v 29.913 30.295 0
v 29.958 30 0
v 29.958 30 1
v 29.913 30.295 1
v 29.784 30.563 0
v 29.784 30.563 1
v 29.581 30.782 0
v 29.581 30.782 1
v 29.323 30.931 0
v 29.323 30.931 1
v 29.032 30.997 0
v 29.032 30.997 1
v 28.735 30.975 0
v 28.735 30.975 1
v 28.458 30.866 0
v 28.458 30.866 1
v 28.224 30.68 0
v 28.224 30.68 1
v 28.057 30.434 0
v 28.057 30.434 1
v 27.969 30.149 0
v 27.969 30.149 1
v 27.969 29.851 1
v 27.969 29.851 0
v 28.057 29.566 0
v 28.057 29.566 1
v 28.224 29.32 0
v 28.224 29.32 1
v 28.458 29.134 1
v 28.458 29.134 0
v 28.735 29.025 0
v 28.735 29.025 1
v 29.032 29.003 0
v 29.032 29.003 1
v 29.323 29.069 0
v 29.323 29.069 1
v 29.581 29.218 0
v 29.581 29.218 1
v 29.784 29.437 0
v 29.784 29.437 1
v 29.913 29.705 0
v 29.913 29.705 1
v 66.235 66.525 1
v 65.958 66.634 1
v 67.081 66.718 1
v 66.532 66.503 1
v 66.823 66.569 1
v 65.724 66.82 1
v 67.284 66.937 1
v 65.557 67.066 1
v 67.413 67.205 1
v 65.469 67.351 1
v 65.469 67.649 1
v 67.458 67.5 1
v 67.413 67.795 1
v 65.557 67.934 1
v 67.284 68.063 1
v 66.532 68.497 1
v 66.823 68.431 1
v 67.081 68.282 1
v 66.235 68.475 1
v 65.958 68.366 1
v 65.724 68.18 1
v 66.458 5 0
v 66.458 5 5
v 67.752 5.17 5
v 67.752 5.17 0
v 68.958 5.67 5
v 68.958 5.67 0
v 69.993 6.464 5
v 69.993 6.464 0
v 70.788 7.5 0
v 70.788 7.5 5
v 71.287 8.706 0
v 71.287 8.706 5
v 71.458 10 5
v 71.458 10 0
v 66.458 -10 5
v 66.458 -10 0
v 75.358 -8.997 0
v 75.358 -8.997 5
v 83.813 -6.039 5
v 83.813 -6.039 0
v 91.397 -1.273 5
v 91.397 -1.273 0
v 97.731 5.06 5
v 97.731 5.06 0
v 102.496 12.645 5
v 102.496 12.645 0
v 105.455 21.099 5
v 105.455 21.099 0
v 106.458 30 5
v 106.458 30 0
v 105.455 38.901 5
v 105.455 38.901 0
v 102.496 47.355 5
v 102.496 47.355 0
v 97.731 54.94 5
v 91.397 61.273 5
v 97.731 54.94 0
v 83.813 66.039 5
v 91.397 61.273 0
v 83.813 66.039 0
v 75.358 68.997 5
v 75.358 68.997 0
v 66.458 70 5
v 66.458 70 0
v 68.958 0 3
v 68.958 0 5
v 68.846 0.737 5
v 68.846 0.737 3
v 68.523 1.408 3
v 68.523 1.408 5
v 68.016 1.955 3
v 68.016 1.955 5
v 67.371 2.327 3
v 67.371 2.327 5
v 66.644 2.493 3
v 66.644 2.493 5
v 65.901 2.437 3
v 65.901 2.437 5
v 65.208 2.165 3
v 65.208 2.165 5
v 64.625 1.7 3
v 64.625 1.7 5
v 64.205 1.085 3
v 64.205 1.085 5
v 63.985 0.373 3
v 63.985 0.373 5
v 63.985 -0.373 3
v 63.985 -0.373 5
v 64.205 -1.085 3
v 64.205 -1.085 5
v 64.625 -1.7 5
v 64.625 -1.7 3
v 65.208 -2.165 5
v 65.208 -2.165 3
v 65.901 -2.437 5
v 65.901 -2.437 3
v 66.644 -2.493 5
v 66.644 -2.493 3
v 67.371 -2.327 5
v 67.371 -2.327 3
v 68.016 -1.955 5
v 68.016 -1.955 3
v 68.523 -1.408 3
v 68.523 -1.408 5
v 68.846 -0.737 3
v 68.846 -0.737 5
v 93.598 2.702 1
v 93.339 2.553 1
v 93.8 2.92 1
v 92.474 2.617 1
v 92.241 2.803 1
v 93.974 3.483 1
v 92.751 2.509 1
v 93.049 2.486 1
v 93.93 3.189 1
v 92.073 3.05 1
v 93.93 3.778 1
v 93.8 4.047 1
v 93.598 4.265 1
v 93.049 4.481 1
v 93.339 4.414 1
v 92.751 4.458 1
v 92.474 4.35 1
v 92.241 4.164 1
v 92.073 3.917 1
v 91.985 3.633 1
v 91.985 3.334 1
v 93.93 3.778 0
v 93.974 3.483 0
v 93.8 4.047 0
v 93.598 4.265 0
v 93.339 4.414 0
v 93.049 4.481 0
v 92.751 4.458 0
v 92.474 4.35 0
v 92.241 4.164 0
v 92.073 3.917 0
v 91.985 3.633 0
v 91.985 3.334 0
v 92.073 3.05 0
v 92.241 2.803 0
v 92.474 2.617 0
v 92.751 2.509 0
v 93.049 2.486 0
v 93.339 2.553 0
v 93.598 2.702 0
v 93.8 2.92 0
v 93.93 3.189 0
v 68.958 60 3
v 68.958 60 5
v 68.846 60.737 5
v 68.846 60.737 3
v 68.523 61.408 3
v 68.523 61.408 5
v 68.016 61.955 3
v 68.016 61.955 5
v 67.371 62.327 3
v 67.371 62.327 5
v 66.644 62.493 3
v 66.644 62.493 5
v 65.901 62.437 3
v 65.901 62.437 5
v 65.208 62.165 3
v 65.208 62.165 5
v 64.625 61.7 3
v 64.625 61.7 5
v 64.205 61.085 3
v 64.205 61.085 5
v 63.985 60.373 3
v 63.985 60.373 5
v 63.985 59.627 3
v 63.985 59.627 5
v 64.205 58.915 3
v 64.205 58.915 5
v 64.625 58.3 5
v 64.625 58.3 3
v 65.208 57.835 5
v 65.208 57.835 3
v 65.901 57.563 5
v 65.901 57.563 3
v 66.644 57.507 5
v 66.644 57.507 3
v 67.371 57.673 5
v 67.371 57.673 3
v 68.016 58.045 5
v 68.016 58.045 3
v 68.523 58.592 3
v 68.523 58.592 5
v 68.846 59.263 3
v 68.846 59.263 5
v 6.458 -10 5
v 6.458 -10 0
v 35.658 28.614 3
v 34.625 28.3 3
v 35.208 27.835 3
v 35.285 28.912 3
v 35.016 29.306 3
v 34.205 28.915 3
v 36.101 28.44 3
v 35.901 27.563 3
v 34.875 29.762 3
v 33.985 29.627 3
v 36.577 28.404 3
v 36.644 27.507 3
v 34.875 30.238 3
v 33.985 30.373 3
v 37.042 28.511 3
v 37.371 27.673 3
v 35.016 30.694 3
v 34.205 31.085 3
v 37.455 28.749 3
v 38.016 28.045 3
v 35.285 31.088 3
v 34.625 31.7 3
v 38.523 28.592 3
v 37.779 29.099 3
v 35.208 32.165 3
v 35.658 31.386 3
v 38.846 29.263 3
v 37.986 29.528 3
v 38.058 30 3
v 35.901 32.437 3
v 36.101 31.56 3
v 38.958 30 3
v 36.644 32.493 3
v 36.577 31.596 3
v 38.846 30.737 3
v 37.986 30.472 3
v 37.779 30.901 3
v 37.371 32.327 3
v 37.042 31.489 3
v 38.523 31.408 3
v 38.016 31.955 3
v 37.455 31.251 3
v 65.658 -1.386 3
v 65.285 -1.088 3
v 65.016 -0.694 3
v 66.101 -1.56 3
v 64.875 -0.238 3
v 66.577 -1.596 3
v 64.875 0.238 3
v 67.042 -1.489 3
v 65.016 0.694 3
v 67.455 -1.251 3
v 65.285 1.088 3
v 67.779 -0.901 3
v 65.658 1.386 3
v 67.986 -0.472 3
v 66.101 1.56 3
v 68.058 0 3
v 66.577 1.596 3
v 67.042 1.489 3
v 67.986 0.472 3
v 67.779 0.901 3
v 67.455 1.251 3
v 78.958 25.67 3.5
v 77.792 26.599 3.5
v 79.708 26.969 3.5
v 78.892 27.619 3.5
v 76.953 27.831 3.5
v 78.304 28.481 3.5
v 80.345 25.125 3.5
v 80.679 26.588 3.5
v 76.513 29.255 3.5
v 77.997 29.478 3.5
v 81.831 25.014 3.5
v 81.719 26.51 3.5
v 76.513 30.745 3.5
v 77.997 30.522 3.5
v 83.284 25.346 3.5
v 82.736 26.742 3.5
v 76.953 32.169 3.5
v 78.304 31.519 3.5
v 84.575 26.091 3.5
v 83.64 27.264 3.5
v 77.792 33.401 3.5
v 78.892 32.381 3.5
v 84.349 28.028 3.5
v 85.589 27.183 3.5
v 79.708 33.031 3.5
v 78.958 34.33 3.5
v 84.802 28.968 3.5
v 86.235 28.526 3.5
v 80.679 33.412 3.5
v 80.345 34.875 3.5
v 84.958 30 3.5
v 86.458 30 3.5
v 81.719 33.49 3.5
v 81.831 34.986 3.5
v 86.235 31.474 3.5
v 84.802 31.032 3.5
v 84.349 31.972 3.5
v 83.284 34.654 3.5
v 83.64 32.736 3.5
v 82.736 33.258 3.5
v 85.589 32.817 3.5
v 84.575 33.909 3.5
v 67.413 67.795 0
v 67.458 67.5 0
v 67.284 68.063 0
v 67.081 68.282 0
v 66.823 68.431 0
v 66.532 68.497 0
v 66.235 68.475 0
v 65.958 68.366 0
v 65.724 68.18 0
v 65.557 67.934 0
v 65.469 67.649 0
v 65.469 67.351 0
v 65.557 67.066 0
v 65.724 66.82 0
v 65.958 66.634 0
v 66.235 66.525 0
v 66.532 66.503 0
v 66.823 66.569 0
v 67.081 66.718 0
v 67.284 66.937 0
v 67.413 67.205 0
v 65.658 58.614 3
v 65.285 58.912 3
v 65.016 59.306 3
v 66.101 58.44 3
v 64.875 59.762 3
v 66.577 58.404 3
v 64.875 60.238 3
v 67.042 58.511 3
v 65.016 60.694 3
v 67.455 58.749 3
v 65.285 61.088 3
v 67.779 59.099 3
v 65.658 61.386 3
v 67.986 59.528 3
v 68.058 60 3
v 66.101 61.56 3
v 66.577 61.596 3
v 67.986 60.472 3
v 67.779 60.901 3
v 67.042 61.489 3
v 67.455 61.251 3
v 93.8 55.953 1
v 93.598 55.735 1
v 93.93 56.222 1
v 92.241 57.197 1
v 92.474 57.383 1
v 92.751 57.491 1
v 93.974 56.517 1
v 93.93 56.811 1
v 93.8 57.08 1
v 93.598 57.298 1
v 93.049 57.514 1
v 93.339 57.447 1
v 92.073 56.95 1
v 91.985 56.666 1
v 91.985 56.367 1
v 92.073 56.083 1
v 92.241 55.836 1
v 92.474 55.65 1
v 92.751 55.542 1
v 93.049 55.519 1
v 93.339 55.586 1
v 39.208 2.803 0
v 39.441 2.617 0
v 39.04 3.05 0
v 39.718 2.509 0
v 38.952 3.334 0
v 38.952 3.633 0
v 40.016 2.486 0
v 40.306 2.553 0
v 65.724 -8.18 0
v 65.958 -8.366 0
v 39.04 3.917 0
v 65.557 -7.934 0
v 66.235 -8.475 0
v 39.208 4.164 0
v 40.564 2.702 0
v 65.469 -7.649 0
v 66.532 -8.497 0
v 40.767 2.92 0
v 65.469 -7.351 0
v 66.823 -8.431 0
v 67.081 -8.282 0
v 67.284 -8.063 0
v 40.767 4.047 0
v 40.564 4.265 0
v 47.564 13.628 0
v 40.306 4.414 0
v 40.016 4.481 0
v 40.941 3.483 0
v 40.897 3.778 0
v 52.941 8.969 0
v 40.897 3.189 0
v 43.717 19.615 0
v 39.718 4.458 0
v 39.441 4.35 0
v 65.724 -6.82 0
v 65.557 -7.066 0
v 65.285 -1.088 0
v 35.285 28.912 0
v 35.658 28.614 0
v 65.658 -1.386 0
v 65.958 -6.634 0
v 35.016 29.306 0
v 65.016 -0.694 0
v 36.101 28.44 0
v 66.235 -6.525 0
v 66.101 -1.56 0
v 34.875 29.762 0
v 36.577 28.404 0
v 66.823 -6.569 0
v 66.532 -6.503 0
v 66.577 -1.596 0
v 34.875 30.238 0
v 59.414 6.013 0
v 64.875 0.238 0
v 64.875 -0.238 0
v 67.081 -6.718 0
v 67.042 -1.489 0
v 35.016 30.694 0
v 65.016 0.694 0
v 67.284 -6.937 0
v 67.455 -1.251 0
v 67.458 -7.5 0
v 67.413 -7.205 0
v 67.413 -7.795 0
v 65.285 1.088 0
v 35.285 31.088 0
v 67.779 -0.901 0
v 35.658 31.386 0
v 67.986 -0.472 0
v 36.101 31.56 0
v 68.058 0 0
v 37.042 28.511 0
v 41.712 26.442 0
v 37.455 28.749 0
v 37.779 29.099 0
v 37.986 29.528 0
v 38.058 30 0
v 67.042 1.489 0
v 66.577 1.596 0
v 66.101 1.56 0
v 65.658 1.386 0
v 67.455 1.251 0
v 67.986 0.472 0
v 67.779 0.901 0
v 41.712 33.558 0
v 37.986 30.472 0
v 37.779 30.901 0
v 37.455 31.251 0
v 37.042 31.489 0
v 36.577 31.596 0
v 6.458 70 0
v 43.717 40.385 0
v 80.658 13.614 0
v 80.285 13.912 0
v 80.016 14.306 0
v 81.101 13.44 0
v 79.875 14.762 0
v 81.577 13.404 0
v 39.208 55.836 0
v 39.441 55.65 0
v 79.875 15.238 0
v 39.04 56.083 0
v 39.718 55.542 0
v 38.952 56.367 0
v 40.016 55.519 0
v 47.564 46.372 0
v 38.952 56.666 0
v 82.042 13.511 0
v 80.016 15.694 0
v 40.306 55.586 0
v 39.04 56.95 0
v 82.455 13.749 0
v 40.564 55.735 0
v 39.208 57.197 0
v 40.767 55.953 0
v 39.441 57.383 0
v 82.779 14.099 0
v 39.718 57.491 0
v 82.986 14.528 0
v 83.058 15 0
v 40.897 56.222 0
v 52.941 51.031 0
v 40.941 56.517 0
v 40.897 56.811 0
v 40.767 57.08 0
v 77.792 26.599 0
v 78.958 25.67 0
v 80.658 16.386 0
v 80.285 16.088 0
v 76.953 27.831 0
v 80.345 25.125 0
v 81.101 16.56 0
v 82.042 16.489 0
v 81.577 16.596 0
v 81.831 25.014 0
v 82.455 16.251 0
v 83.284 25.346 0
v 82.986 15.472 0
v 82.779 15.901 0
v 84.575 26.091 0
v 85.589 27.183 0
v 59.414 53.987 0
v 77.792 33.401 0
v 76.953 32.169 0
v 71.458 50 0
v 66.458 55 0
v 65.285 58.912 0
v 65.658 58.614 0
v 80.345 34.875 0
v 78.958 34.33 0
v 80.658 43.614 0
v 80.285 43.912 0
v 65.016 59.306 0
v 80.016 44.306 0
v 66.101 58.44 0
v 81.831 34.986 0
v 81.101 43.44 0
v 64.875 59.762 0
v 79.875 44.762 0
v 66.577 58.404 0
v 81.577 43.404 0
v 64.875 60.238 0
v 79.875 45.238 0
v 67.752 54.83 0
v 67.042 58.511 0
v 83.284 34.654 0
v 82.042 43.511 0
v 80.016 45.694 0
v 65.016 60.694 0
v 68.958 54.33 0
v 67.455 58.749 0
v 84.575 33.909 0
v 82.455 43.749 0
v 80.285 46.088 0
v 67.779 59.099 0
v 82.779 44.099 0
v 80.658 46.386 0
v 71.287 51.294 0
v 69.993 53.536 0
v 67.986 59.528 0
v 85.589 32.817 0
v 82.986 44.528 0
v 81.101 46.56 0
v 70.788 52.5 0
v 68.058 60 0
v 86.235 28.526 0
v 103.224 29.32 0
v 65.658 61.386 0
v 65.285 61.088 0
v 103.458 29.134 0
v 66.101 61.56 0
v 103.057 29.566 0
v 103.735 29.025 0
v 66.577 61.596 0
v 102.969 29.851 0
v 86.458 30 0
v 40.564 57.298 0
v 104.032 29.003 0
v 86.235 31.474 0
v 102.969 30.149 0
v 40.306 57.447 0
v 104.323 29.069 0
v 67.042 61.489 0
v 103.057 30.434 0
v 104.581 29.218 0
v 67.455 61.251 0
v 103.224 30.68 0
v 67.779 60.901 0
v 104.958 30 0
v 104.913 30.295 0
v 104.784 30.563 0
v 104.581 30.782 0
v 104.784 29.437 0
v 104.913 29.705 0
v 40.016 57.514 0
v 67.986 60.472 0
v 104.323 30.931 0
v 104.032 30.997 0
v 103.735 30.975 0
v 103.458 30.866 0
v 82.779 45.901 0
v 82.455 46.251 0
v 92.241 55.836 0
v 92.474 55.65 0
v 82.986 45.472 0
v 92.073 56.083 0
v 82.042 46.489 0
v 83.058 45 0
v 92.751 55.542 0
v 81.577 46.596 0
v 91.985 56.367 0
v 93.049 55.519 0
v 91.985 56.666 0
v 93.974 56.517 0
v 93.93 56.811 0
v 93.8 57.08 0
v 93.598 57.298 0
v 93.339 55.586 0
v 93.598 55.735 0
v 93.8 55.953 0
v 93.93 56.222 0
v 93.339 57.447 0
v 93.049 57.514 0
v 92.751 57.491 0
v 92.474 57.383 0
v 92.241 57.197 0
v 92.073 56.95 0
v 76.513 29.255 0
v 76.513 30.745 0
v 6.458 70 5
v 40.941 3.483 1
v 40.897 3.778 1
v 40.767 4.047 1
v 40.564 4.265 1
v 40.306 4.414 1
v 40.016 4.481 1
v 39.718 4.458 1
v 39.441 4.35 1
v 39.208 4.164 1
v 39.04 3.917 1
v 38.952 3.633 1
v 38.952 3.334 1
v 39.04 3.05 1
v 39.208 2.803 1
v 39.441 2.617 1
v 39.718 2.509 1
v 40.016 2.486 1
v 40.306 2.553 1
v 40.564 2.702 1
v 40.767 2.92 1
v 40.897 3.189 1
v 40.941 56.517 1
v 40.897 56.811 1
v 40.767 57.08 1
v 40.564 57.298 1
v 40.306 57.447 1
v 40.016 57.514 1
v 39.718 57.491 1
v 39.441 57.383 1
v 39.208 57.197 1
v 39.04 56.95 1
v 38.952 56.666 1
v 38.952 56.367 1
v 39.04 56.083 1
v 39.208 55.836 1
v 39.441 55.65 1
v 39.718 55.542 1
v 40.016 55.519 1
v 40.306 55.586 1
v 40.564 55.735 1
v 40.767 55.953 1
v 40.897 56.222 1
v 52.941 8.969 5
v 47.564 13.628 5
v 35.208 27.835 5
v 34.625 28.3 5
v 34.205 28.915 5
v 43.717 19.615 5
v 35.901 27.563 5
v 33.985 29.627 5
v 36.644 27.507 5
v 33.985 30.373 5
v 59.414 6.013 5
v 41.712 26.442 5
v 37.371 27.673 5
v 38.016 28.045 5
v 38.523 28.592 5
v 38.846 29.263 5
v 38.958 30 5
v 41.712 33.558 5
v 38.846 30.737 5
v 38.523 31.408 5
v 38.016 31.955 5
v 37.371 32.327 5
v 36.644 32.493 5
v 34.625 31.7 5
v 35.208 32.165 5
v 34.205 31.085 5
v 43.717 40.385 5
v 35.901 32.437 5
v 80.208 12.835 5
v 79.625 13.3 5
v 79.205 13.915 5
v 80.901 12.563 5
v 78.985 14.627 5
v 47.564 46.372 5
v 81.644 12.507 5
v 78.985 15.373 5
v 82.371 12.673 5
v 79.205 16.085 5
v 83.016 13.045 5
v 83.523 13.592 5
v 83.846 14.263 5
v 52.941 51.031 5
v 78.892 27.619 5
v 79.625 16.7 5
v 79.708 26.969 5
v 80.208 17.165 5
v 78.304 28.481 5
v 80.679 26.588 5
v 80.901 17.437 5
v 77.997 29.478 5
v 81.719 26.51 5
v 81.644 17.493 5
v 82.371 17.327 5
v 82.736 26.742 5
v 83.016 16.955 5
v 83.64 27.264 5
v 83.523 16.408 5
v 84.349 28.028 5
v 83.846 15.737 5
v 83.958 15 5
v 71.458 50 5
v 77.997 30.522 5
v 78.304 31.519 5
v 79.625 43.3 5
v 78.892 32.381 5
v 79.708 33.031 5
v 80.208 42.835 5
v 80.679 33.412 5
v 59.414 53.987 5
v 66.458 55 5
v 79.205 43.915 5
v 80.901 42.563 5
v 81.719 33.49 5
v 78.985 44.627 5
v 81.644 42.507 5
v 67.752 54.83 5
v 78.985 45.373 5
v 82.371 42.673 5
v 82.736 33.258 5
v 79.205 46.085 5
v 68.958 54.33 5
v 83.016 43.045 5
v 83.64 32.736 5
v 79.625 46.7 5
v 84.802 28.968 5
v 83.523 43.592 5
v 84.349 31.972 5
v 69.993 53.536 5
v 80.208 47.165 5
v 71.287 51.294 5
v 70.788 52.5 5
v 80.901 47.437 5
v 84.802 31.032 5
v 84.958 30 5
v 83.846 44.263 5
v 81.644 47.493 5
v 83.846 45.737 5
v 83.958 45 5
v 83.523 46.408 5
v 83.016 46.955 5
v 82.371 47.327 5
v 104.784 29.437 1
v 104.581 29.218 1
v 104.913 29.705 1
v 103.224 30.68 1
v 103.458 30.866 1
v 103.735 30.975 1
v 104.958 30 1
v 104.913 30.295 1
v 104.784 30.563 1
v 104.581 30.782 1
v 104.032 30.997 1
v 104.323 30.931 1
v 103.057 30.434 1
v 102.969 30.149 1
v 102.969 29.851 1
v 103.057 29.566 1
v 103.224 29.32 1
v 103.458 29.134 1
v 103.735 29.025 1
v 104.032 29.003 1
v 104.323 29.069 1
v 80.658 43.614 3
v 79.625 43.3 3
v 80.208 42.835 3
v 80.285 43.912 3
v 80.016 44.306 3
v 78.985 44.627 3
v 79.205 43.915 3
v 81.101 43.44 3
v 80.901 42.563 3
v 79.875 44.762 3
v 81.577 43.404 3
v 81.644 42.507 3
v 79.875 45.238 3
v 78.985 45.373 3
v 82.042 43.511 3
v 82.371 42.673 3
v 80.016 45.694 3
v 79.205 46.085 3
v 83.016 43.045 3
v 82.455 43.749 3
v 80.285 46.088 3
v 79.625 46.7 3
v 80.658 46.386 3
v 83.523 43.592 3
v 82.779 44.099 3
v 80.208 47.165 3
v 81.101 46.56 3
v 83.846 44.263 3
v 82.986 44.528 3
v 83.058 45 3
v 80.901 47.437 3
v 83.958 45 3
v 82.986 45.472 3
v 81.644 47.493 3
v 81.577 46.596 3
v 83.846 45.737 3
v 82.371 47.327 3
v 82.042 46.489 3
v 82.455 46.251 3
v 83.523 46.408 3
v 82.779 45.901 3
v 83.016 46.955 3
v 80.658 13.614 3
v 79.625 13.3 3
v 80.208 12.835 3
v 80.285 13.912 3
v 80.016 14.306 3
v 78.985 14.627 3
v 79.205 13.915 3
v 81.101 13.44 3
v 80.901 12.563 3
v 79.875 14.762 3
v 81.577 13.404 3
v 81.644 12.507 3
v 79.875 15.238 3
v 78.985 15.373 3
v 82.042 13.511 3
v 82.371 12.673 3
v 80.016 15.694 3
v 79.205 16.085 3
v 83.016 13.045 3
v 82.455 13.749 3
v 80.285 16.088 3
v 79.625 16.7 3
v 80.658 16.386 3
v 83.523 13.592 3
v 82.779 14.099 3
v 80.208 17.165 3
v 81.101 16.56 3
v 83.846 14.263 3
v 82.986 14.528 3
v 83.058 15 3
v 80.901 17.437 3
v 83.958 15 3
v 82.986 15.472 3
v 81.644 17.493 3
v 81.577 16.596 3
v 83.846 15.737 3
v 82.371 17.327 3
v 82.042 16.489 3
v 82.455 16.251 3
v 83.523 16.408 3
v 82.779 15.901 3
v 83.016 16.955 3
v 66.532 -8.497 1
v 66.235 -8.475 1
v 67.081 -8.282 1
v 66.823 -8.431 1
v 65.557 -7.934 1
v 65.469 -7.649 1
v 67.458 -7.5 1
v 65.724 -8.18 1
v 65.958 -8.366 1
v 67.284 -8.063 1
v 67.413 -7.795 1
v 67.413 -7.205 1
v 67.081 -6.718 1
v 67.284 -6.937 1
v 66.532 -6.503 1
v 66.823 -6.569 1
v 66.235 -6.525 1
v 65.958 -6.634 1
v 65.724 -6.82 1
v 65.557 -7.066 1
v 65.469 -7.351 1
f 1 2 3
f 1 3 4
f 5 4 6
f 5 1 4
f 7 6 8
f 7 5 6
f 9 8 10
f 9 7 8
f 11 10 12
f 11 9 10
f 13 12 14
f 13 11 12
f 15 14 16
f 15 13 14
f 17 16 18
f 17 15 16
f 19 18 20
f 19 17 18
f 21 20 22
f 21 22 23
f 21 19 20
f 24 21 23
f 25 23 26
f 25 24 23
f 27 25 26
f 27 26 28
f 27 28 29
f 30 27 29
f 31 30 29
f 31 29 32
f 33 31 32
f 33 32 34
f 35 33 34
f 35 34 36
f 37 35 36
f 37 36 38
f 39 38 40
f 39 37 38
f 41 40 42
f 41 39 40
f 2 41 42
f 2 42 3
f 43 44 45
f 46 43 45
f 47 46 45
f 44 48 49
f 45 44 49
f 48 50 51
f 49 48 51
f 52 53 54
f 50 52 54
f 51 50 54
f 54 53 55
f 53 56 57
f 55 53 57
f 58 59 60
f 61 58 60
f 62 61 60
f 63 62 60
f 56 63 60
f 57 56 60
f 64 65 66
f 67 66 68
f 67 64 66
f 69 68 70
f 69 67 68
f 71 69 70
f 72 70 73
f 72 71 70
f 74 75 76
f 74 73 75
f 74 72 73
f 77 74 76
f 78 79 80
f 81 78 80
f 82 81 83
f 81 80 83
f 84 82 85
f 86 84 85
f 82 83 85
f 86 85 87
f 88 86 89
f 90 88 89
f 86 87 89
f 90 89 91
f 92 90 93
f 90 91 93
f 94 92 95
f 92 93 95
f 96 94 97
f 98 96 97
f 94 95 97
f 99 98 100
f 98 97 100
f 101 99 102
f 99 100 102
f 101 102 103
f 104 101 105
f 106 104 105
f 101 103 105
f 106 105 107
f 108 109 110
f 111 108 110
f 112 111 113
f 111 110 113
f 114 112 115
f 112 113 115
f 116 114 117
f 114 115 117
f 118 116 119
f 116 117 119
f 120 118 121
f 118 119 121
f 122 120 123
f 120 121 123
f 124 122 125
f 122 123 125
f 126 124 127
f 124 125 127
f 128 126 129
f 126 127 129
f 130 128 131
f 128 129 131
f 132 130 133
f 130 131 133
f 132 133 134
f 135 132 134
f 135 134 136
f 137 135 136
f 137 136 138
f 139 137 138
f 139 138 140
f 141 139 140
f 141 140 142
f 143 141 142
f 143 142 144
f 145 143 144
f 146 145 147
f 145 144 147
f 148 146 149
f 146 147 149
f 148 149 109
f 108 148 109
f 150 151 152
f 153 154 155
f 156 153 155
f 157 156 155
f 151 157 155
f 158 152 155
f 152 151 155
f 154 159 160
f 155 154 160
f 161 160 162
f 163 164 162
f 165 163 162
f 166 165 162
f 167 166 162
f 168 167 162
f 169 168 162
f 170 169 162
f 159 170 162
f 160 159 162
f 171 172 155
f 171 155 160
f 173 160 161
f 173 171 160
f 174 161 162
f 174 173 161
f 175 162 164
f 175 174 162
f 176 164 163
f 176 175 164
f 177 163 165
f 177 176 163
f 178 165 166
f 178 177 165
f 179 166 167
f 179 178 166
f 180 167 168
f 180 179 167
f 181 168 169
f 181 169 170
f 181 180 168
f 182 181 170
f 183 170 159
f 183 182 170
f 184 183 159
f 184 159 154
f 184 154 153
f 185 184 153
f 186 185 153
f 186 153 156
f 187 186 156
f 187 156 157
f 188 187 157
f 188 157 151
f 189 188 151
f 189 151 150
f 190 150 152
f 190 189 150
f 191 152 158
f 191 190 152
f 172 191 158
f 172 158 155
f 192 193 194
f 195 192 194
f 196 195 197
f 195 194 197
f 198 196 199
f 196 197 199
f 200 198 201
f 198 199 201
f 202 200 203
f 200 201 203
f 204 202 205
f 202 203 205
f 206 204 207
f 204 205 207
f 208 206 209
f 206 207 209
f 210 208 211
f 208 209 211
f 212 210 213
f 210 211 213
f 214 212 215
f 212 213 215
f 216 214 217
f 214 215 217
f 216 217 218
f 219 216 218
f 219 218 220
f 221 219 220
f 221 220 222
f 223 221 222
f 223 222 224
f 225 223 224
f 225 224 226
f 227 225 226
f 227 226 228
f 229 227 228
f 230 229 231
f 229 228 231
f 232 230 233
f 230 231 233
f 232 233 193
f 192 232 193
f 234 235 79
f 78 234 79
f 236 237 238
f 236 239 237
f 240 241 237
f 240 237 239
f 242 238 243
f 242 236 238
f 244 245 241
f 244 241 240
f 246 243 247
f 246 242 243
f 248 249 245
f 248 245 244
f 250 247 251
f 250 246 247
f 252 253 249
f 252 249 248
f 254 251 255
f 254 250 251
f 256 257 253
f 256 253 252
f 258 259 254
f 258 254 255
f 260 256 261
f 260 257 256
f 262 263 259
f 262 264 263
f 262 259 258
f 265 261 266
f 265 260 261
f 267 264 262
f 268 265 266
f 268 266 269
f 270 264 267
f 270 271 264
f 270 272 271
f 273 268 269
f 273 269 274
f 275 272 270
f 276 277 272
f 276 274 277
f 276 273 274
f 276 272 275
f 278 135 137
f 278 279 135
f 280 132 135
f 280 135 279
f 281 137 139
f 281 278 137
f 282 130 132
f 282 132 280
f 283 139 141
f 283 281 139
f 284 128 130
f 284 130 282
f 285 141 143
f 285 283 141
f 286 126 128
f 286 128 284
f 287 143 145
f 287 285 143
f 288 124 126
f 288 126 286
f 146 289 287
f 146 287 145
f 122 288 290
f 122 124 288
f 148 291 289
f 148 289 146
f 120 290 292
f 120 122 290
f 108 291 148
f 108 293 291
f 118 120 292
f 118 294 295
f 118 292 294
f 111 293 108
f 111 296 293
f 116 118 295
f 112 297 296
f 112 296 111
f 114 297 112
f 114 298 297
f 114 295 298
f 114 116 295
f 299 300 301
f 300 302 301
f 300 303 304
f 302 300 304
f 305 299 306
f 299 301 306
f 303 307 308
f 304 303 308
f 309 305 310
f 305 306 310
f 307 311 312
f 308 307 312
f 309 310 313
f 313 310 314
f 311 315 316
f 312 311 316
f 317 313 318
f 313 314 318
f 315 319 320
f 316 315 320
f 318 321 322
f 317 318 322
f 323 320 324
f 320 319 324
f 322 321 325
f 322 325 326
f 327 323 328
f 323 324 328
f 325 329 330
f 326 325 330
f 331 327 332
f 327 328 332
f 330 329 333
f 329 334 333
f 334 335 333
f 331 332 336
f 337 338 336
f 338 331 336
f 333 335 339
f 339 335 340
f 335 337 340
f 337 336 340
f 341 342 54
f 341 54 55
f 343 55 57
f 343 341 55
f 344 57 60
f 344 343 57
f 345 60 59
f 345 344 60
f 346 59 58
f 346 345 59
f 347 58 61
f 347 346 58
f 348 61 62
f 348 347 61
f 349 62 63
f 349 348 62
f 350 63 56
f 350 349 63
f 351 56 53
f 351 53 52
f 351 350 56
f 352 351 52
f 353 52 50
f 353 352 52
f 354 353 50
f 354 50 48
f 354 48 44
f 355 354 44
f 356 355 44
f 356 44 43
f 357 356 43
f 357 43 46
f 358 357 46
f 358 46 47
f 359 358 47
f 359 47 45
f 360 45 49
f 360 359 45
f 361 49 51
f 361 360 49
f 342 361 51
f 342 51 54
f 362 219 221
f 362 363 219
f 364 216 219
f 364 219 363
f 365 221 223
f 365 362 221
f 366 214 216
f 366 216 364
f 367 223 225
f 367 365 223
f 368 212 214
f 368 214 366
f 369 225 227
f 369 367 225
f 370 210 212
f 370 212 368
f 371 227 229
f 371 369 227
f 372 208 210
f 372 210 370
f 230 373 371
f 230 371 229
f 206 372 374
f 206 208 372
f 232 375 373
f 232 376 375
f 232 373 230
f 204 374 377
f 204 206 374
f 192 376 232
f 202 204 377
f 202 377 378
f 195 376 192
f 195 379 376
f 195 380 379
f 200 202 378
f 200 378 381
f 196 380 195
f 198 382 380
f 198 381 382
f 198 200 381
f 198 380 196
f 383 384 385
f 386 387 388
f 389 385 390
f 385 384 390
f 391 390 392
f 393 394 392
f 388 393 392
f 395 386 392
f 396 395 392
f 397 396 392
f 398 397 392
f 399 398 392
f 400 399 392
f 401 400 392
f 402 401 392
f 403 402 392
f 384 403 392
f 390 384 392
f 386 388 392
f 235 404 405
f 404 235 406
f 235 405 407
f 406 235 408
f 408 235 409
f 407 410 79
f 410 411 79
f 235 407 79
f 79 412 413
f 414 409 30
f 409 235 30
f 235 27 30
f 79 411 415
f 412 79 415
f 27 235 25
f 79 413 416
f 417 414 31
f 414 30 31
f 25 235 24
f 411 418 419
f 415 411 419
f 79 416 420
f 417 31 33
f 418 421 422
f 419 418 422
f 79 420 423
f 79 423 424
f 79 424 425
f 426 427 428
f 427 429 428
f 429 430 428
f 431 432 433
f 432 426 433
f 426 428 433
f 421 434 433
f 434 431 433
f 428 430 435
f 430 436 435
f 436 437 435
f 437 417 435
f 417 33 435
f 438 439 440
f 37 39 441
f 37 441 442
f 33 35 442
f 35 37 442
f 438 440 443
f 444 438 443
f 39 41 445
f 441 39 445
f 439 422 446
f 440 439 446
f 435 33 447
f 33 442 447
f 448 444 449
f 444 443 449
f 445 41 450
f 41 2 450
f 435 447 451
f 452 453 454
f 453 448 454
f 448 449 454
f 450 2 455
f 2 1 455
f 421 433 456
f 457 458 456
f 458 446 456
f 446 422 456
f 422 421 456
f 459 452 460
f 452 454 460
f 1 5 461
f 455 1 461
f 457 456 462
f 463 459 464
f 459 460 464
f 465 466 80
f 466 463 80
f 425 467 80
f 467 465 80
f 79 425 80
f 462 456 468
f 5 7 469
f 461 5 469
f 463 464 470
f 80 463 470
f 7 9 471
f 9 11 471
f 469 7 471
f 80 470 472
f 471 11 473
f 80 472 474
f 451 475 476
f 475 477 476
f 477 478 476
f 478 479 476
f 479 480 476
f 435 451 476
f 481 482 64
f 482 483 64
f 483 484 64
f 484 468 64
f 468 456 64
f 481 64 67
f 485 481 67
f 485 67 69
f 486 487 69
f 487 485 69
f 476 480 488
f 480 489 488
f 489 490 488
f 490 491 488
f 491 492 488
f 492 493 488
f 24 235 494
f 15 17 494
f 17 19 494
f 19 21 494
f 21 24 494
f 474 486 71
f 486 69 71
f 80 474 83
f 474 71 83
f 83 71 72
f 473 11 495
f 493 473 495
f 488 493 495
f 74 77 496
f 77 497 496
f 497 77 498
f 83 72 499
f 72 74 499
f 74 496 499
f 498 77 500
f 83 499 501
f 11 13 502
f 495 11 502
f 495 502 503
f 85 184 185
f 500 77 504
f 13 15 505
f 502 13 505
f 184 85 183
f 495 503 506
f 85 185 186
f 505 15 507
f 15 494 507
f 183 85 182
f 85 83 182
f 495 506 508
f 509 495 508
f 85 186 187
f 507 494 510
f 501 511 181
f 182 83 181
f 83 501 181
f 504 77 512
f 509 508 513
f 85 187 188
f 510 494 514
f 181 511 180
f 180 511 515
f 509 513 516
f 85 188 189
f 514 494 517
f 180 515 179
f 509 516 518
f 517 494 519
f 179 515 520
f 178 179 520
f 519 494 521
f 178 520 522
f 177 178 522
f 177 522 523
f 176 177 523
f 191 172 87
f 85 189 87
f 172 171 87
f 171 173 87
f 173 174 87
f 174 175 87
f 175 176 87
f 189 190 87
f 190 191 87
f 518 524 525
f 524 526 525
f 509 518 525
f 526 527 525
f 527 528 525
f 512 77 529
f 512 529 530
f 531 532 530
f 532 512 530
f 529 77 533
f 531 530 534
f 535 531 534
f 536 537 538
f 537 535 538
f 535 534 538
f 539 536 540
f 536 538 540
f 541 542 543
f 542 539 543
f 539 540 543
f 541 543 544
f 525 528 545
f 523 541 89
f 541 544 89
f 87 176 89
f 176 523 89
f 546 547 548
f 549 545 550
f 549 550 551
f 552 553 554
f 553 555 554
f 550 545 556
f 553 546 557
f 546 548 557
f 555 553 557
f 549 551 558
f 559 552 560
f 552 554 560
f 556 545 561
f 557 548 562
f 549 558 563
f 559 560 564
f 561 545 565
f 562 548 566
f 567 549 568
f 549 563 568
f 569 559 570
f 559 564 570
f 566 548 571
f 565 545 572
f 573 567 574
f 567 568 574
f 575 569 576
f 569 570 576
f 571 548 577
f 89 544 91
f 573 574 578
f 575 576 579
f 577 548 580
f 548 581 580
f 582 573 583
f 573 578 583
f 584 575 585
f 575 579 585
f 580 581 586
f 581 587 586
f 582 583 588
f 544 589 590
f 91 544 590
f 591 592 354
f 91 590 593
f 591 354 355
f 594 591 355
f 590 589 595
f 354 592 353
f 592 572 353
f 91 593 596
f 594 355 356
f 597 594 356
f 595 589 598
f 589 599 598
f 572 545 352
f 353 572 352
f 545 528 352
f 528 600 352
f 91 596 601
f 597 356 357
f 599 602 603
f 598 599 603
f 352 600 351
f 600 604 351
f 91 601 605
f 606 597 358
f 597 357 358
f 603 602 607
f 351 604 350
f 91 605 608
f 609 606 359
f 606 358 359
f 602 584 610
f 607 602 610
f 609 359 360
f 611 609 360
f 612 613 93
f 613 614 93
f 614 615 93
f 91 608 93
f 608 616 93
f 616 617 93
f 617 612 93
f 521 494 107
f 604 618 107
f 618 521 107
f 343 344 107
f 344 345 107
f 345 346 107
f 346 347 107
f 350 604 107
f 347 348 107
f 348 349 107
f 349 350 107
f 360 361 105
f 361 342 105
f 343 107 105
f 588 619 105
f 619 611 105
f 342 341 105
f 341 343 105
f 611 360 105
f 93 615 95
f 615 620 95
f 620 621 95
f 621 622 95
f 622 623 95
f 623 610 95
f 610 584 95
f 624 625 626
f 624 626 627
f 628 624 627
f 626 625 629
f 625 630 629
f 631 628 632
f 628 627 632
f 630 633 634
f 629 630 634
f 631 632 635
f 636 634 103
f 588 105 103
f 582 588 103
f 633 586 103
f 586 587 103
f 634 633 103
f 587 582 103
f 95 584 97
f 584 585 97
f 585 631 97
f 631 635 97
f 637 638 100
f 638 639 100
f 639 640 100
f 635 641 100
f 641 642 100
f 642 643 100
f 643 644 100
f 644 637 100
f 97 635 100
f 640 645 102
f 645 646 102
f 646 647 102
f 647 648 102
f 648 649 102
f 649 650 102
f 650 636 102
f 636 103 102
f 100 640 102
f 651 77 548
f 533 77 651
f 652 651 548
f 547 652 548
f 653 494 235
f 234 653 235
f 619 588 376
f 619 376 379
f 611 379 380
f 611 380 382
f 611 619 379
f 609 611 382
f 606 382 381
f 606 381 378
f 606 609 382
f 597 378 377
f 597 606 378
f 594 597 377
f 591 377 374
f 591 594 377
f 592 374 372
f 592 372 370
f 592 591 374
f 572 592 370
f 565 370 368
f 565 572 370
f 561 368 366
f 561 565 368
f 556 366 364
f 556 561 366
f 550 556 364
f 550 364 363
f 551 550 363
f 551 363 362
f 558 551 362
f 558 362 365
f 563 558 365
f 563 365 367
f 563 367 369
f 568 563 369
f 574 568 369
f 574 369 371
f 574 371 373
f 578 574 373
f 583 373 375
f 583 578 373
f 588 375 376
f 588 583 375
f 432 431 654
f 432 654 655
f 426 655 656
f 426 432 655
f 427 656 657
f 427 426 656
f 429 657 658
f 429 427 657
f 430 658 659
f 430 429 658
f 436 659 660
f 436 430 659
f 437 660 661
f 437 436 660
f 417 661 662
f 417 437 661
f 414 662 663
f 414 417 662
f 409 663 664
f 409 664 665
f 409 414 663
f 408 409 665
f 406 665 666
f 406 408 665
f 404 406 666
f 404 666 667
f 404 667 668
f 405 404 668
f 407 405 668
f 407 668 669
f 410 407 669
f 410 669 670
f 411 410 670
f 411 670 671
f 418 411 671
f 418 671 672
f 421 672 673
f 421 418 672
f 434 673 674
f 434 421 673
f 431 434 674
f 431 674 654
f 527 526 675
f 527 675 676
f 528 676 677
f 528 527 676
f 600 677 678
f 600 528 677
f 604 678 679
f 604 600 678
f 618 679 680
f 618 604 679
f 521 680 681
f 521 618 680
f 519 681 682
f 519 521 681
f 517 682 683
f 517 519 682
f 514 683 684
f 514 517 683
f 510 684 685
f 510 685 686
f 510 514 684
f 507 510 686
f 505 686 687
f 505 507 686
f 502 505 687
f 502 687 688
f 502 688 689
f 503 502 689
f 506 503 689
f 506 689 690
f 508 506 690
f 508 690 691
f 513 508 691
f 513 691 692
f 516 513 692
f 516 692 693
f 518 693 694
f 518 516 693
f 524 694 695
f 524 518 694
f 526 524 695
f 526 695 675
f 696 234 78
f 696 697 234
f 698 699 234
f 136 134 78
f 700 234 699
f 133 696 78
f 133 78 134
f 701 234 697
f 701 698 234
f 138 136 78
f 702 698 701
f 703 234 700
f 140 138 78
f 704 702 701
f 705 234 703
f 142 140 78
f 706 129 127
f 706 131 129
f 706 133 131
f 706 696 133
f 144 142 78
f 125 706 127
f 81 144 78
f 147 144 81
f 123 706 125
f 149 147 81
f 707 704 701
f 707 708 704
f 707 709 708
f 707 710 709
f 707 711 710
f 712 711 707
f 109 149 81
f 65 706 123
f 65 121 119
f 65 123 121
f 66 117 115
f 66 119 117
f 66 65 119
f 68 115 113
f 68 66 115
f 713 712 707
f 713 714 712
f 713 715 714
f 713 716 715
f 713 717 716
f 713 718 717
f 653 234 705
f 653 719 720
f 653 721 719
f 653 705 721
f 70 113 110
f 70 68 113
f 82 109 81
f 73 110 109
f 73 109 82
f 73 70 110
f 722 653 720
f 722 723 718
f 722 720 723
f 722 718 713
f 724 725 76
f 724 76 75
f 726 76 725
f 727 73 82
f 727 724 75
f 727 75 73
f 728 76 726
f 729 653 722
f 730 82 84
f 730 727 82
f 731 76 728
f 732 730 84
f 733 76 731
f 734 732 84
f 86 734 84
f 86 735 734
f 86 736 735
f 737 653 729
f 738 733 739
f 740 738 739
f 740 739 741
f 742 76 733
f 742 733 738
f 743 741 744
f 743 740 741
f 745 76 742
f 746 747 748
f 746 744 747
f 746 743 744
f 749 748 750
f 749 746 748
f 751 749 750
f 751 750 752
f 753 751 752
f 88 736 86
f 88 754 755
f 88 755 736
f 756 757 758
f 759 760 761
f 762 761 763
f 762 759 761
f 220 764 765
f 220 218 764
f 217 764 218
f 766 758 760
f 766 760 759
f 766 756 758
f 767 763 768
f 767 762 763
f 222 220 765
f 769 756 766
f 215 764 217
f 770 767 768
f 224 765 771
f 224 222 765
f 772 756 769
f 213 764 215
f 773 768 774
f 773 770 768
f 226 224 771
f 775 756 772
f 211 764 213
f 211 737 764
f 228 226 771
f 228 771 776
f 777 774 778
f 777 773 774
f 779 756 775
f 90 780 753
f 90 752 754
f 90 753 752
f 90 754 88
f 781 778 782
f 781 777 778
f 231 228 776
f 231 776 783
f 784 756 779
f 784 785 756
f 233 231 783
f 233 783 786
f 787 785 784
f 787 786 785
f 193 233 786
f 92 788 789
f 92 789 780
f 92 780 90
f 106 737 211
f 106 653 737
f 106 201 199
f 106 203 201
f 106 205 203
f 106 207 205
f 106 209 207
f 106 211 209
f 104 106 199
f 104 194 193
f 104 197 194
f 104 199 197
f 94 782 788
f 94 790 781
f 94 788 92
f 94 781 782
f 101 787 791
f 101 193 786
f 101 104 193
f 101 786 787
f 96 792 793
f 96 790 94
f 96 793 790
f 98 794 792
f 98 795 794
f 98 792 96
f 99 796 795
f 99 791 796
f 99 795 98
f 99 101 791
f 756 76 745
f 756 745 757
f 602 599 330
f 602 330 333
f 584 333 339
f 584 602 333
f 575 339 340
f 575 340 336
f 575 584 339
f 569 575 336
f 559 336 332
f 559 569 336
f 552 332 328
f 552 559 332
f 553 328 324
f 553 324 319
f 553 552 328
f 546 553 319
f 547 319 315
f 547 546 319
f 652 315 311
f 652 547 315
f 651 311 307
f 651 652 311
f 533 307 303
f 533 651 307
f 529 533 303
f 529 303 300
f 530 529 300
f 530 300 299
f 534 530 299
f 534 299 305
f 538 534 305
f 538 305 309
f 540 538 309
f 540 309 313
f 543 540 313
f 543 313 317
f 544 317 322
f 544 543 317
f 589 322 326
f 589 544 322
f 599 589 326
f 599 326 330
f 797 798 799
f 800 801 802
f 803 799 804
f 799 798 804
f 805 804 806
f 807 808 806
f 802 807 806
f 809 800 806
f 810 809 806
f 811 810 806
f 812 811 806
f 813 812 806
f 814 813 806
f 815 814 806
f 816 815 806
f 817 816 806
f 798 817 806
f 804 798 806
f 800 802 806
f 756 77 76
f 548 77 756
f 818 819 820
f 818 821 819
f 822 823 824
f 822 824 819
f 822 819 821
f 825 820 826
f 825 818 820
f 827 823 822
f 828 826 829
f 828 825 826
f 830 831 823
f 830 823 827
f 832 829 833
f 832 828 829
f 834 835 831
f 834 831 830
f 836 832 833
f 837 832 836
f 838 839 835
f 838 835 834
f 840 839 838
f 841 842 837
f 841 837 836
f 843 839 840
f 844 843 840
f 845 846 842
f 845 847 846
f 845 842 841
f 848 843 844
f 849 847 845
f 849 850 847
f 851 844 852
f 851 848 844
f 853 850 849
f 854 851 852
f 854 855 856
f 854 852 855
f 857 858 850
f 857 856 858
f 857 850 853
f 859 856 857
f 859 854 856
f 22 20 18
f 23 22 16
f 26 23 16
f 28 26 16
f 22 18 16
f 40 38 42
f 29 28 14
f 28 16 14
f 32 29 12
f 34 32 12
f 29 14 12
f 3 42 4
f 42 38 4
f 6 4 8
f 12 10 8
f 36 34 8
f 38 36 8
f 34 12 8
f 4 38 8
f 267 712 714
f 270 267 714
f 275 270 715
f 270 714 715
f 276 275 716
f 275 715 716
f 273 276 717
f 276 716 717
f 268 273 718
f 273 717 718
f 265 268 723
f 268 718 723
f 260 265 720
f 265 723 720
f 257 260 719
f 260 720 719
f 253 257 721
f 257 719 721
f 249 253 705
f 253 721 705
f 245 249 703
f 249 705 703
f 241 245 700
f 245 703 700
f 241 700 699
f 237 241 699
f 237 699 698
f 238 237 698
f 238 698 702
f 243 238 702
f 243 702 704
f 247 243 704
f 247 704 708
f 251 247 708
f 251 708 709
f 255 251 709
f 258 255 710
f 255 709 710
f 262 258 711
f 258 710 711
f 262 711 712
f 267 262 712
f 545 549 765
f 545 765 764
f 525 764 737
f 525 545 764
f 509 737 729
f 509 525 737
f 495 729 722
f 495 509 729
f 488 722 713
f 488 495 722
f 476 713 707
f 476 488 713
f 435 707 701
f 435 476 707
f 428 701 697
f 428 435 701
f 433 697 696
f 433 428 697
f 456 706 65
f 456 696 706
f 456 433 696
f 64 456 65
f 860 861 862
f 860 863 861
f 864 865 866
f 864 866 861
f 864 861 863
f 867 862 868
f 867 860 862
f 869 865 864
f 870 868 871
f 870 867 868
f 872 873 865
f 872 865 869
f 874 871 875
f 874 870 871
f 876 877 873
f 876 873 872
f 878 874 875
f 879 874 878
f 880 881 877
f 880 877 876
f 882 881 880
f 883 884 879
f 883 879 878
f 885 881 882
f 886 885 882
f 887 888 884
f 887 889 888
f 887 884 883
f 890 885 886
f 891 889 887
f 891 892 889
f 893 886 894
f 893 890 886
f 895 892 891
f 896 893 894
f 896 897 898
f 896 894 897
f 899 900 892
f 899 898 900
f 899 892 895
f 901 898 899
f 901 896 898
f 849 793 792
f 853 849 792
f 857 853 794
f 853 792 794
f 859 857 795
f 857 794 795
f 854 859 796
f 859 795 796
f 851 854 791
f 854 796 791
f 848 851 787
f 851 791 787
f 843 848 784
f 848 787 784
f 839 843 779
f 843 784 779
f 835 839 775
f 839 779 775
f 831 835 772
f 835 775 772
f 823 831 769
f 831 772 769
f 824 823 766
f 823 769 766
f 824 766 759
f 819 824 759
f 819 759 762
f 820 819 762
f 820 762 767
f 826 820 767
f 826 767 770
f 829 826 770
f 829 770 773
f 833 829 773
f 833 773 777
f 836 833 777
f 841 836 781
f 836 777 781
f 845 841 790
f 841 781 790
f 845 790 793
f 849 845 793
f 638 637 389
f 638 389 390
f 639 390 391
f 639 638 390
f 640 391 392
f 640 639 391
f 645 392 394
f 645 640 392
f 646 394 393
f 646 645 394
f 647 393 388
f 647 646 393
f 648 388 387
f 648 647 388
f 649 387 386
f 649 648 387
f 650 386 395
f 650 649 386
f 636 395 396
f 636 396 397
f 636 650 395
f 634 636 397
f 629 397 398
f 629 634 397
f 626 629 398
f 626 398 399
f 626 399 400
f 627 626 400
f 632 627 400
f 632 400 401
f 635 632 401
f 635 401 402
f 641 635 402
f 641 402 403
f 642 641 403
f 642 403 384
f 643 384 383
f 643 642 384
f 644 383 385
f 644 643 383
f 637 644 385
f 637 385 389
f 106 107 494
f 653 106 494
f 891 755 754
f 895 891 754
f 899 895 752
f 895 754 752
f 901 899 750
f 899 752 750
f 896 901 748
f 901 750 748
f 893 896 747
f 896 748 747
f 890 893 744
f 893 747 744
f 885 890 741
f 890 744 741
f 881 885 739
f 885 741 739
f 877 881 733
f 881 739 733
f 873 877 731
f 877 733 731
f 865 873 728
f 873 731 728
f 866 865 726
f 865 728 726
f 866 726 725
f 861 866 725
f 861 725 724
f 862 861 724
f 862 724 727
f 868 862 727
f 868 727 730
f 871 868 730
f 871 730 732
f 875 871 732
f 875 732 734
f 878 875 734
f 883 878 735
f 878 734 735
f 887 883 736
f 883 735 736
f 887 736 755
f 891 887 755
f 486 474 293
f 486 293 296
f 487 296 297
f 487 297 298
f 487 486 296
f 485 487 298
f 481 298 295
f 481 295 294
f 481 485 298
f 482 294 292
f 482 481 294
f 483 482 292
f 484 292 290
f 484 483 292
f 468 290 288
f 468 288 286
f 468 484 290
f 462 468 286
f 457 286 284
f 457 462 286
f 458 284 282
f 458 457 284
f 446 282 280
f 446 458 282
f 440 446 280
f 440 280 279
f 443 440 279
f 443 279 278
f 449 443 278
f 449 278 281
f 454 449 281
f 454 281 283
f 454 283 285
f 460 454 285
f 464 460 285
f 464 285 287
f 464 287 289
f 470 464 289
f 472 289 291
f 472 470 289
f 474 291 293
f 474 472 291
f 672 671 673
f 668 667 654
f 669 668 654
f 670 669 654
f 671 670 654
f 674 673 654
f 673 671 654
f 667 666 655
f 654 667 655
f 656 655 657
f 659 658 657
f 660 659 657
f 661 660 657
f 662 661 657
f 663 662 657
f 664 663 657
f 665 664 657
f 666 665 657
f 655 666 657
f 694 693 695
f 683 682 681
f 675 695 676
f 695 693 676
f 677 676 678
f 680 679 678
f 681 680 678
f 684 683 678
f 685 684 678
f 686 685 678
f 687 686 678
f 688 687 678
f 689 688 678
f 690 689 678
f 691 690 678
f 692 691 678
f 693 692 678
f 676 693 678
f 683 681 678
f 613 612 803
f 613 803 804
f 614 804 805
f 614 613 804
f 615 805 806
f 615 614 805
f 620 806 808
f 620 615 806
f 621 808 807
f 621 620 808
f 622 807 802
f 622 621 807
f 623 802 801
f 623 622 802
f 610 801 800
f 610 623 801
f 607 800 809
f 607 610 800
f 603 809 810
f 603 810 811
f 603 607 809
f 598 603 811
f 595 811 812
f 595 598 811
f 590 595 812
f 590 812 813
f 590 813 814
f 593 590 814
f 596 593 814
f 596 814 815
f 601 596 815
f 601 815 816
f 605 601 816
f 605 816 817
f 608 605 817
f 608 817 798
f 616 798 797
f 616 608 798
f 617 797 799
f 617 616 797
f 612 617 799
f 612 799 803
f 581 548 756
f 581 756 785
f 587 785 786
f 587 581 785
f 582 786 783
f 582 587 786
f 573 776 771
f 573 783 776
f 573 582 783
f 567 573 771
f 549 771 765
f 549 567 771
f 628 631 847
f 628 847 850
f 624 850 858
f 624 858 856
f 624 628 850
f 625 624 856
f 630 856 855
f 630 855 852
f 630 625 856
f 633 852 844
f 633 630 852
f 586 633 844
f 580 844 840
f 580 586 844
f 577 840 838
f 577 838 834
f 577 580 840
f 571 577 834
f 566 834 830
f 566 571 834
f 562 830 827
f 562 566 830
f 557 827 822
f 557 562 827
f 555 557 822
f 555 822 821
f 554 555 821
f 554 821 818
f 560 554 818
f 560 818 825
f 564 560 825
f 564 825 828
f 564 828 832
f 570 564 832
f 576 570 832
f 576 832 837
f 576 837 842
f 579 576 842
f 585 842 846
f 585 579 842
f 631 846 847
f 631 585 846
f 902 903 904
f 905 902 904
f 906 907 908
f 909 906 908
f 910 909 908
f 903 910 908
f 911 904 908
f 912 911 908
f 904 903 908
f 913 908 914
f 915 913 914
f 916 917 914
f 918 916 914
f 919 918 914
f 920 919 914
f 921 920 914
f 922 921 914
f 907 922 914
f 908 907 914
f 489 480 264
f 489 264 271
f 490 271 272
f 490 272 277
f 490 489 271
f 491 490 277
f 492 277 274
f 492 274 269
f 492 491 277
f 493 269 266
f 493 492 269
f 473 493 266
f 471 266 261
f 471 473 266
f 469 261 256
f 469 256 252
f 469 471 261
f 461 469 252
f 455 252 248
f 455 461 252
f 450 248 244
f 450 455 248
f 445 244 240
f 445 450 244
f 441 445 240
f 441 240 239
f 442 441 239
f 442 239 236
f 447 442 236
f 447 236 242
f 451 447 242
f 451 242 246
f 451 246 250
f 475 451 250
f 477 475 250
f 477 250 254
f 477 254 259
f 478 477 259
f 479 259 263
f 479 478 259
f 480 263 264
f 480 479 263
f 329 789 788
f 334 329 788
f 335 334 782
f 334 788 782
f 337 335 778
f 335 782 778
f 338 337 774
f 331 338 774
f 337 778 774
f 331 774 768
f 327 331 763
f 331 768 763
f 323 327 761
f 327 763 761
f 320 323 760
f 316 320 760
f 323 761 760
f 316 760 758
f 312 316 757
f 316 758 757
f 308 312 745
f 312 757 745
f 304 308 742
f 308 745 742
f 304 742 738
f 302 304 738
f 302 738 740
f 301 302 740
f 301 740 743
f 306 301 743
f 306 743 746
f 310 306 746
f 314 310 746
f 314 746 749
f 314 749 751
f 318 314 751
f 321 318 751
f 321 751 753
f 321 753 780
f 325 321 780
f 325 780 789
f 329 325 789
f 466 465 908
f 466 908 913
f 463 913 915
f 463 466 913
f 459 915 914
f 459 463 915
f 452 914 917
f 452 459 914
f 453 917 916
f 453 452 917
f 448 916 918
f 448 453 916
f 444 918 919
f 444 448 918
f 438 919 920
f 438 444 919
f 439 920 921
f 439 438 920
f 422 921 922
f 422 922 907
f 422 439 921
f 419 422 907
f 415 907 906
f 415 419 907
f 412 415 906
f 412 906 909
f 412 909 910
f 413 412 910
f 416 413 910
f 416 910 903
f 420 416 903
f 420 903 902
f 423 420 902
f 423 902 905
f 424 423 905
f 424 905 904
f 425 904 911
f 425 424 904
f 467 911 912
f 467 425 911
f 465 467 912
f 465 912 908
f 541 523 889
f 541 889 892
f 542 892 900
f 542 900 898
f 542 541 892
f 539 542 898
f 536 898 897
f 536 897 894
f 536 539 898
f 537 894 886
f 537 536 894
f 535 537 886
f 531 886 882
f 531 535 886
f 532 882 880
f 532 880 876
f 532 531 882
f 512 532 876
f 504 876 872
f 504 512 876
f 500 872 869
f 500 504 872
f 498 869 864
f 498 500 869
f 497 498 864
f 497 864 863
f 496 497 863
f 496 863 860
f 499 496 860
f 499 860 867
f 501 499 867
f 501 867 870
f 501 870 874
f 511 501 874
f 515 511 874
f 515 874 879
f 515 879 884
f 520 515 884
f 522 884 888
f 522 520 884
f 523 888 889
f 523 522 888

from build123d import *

# Parameters (mm, degrees)
EXTRUDE_1_DEPTH      = 5
CUT_EXTRUDE_2_DEPTH  = 10
SKETCH_4_R           = 5
CUT_EXTRUDE_3_DEPTH  = 3.5
SKETCH_8_R           = 1
CUT_EXTRUDE_7_DEPTH  = 1
SKETCH_10_R          = 2.5
CUT_EXTRUDE_8_DEPTH  = 2
SKETCH_9_R           = 1.6
CUT_EXTRUDE_9_DEPTH  = 3
SKETCH_11_R          = 3.5
CUT_EXTRUDE_10_DEPTH = 10


with BuildPart() as part:
    # 草图1 → 凸台-拉伸1 (new body)
    with BuildSketch(Plane.XY):
        with BuildLine():
            Line((66.457513111, 70), (6.457513111, 70))
            Line((6.457513111, 70), (6.457513111, -10))
            Line((6.457513111, -10), (66.457513111, -10))
            ThreePointArc((66.457513111, -10), (106.457513111, 30), (66.457513111, 70))
        make_face()
    extrude(amount=EXTRUDE_1_DEPTH)

    # 草图3 → 切除-拉伸2 (cut)
    with BuildSketch(Plane.XY):
        with BuildLine():
            Line((71.457513111, 35), (71.457513111, 50))
            ThreePointArc((71.457513111, 50), (69.993047017, 53.535533906), (66.457513111, 55))
            ThreePointArc((66.457513111, 55), (41.457513111, 30), (66.457513111, 5))
            ThreePointArc((66.457513111, 5), (69.993047017, 6.464466094), (71.457513111, 10))
            Line((71.457513111, 10), (71.457513111, 35))
        make_face()
    extrude(amount=CUT_EXTRUDE_2_DEPTH, mode=Mode.SUBTRACT)

    # 草图4 → 切除-拉伸3 (cut)
    with BuildSketch(Plane.XY):
        with Locations((81.457513111, 30)):
            Circle(SKETCH_4_R)
    extrude(amount=CUT_EXTRUDE_3_DEPTH, mode=Mode.SUBTRACT)

    # 草图8 → 切除-拉伸7 (cut)
    with BuildSketch(Plane.XY):
        with Locations((66.457513111, 67.5)):
            Circle(SKETCH_8_R)
        with Locations((92.974017405, 56.516504294)):
            Circle(SKETCH_8_R)
        with Locations((103.957513111, 30)):
            Circle(SKETCH_8_R)
        with Locations((92.974017405, 3.483495706)):
            Circle(SKETCH_8_R)
        with Locations((66.457513111, -7.5)):
            Circle(SKETCH_8_R)
        with Locations((39.941008816, 3.483495706)):
            Circle(SKETCH_8_R)
        with Locations((28.957513111, 30)):
            Circle(SKETCH_8_R)
        with Locations((39.941008816, 56.516504294)):
            Circle(SKETCH_8_R)
    extrude(amount=CUT_EXTRUDE_7_DEPTH, mode=Mode.SUBTRACT)

    # 草图10 → 切除-拉伸8 (cut)
    with BuildSketch(Plane.XY.offset(5)):
        with Locations((66.457513111, 60)):
            Circle(SKETCH_10_R)
        with Locations((81.457513111, 45)):
            Circle(SKETCH_10_R)
        with Locations((66.457513111, 0)):
            Circle(SKETCH_10_R)
        with Locations((36.457513111, 30)):
            Circle(SKETCH_10_R)
        with Locations((81.457513111, 15)):
            Circle(SKETCH_10_R)
    extrude(amount=-CUT_EXTRUDE_8_DEPTH, mode=Mode.SUBTRACT)

    # 草图9 → 切除-拉伸9 (cut)
    with BuildSketch(Plane.XY):
        with Locations((81.457513111, 45)):
            Circle(SKETCH_9_R)
        with Locations((66.457513111, 60)):
            Circle(SKETCH_9_R)
        with Locations((81.457513111, 15)):
            Circle(SKETCH_9_R)
        with Locations((66.457513111, 0)):
            Circle(SKETCH_9_R)
        with Locations((36.457513111, 30)):
            Circle(SKETCH_9_R)
    extrude(amount=CUT_EXTRUDE_9_DEPTH, mode=Mode.SUBTRACT)

    # 草图11 → 切除-拉伸10 (cut)
    with BuildSketch(Plane.XY.offset(5)):
        with Locations((81.457513111, 30)):
            Circle(SKETCH_11_R)
    extrude(amount=-CUT_EXTRUDE_10_DEPTH, mode=Mode.SUBTRACT)


solid = part.part
